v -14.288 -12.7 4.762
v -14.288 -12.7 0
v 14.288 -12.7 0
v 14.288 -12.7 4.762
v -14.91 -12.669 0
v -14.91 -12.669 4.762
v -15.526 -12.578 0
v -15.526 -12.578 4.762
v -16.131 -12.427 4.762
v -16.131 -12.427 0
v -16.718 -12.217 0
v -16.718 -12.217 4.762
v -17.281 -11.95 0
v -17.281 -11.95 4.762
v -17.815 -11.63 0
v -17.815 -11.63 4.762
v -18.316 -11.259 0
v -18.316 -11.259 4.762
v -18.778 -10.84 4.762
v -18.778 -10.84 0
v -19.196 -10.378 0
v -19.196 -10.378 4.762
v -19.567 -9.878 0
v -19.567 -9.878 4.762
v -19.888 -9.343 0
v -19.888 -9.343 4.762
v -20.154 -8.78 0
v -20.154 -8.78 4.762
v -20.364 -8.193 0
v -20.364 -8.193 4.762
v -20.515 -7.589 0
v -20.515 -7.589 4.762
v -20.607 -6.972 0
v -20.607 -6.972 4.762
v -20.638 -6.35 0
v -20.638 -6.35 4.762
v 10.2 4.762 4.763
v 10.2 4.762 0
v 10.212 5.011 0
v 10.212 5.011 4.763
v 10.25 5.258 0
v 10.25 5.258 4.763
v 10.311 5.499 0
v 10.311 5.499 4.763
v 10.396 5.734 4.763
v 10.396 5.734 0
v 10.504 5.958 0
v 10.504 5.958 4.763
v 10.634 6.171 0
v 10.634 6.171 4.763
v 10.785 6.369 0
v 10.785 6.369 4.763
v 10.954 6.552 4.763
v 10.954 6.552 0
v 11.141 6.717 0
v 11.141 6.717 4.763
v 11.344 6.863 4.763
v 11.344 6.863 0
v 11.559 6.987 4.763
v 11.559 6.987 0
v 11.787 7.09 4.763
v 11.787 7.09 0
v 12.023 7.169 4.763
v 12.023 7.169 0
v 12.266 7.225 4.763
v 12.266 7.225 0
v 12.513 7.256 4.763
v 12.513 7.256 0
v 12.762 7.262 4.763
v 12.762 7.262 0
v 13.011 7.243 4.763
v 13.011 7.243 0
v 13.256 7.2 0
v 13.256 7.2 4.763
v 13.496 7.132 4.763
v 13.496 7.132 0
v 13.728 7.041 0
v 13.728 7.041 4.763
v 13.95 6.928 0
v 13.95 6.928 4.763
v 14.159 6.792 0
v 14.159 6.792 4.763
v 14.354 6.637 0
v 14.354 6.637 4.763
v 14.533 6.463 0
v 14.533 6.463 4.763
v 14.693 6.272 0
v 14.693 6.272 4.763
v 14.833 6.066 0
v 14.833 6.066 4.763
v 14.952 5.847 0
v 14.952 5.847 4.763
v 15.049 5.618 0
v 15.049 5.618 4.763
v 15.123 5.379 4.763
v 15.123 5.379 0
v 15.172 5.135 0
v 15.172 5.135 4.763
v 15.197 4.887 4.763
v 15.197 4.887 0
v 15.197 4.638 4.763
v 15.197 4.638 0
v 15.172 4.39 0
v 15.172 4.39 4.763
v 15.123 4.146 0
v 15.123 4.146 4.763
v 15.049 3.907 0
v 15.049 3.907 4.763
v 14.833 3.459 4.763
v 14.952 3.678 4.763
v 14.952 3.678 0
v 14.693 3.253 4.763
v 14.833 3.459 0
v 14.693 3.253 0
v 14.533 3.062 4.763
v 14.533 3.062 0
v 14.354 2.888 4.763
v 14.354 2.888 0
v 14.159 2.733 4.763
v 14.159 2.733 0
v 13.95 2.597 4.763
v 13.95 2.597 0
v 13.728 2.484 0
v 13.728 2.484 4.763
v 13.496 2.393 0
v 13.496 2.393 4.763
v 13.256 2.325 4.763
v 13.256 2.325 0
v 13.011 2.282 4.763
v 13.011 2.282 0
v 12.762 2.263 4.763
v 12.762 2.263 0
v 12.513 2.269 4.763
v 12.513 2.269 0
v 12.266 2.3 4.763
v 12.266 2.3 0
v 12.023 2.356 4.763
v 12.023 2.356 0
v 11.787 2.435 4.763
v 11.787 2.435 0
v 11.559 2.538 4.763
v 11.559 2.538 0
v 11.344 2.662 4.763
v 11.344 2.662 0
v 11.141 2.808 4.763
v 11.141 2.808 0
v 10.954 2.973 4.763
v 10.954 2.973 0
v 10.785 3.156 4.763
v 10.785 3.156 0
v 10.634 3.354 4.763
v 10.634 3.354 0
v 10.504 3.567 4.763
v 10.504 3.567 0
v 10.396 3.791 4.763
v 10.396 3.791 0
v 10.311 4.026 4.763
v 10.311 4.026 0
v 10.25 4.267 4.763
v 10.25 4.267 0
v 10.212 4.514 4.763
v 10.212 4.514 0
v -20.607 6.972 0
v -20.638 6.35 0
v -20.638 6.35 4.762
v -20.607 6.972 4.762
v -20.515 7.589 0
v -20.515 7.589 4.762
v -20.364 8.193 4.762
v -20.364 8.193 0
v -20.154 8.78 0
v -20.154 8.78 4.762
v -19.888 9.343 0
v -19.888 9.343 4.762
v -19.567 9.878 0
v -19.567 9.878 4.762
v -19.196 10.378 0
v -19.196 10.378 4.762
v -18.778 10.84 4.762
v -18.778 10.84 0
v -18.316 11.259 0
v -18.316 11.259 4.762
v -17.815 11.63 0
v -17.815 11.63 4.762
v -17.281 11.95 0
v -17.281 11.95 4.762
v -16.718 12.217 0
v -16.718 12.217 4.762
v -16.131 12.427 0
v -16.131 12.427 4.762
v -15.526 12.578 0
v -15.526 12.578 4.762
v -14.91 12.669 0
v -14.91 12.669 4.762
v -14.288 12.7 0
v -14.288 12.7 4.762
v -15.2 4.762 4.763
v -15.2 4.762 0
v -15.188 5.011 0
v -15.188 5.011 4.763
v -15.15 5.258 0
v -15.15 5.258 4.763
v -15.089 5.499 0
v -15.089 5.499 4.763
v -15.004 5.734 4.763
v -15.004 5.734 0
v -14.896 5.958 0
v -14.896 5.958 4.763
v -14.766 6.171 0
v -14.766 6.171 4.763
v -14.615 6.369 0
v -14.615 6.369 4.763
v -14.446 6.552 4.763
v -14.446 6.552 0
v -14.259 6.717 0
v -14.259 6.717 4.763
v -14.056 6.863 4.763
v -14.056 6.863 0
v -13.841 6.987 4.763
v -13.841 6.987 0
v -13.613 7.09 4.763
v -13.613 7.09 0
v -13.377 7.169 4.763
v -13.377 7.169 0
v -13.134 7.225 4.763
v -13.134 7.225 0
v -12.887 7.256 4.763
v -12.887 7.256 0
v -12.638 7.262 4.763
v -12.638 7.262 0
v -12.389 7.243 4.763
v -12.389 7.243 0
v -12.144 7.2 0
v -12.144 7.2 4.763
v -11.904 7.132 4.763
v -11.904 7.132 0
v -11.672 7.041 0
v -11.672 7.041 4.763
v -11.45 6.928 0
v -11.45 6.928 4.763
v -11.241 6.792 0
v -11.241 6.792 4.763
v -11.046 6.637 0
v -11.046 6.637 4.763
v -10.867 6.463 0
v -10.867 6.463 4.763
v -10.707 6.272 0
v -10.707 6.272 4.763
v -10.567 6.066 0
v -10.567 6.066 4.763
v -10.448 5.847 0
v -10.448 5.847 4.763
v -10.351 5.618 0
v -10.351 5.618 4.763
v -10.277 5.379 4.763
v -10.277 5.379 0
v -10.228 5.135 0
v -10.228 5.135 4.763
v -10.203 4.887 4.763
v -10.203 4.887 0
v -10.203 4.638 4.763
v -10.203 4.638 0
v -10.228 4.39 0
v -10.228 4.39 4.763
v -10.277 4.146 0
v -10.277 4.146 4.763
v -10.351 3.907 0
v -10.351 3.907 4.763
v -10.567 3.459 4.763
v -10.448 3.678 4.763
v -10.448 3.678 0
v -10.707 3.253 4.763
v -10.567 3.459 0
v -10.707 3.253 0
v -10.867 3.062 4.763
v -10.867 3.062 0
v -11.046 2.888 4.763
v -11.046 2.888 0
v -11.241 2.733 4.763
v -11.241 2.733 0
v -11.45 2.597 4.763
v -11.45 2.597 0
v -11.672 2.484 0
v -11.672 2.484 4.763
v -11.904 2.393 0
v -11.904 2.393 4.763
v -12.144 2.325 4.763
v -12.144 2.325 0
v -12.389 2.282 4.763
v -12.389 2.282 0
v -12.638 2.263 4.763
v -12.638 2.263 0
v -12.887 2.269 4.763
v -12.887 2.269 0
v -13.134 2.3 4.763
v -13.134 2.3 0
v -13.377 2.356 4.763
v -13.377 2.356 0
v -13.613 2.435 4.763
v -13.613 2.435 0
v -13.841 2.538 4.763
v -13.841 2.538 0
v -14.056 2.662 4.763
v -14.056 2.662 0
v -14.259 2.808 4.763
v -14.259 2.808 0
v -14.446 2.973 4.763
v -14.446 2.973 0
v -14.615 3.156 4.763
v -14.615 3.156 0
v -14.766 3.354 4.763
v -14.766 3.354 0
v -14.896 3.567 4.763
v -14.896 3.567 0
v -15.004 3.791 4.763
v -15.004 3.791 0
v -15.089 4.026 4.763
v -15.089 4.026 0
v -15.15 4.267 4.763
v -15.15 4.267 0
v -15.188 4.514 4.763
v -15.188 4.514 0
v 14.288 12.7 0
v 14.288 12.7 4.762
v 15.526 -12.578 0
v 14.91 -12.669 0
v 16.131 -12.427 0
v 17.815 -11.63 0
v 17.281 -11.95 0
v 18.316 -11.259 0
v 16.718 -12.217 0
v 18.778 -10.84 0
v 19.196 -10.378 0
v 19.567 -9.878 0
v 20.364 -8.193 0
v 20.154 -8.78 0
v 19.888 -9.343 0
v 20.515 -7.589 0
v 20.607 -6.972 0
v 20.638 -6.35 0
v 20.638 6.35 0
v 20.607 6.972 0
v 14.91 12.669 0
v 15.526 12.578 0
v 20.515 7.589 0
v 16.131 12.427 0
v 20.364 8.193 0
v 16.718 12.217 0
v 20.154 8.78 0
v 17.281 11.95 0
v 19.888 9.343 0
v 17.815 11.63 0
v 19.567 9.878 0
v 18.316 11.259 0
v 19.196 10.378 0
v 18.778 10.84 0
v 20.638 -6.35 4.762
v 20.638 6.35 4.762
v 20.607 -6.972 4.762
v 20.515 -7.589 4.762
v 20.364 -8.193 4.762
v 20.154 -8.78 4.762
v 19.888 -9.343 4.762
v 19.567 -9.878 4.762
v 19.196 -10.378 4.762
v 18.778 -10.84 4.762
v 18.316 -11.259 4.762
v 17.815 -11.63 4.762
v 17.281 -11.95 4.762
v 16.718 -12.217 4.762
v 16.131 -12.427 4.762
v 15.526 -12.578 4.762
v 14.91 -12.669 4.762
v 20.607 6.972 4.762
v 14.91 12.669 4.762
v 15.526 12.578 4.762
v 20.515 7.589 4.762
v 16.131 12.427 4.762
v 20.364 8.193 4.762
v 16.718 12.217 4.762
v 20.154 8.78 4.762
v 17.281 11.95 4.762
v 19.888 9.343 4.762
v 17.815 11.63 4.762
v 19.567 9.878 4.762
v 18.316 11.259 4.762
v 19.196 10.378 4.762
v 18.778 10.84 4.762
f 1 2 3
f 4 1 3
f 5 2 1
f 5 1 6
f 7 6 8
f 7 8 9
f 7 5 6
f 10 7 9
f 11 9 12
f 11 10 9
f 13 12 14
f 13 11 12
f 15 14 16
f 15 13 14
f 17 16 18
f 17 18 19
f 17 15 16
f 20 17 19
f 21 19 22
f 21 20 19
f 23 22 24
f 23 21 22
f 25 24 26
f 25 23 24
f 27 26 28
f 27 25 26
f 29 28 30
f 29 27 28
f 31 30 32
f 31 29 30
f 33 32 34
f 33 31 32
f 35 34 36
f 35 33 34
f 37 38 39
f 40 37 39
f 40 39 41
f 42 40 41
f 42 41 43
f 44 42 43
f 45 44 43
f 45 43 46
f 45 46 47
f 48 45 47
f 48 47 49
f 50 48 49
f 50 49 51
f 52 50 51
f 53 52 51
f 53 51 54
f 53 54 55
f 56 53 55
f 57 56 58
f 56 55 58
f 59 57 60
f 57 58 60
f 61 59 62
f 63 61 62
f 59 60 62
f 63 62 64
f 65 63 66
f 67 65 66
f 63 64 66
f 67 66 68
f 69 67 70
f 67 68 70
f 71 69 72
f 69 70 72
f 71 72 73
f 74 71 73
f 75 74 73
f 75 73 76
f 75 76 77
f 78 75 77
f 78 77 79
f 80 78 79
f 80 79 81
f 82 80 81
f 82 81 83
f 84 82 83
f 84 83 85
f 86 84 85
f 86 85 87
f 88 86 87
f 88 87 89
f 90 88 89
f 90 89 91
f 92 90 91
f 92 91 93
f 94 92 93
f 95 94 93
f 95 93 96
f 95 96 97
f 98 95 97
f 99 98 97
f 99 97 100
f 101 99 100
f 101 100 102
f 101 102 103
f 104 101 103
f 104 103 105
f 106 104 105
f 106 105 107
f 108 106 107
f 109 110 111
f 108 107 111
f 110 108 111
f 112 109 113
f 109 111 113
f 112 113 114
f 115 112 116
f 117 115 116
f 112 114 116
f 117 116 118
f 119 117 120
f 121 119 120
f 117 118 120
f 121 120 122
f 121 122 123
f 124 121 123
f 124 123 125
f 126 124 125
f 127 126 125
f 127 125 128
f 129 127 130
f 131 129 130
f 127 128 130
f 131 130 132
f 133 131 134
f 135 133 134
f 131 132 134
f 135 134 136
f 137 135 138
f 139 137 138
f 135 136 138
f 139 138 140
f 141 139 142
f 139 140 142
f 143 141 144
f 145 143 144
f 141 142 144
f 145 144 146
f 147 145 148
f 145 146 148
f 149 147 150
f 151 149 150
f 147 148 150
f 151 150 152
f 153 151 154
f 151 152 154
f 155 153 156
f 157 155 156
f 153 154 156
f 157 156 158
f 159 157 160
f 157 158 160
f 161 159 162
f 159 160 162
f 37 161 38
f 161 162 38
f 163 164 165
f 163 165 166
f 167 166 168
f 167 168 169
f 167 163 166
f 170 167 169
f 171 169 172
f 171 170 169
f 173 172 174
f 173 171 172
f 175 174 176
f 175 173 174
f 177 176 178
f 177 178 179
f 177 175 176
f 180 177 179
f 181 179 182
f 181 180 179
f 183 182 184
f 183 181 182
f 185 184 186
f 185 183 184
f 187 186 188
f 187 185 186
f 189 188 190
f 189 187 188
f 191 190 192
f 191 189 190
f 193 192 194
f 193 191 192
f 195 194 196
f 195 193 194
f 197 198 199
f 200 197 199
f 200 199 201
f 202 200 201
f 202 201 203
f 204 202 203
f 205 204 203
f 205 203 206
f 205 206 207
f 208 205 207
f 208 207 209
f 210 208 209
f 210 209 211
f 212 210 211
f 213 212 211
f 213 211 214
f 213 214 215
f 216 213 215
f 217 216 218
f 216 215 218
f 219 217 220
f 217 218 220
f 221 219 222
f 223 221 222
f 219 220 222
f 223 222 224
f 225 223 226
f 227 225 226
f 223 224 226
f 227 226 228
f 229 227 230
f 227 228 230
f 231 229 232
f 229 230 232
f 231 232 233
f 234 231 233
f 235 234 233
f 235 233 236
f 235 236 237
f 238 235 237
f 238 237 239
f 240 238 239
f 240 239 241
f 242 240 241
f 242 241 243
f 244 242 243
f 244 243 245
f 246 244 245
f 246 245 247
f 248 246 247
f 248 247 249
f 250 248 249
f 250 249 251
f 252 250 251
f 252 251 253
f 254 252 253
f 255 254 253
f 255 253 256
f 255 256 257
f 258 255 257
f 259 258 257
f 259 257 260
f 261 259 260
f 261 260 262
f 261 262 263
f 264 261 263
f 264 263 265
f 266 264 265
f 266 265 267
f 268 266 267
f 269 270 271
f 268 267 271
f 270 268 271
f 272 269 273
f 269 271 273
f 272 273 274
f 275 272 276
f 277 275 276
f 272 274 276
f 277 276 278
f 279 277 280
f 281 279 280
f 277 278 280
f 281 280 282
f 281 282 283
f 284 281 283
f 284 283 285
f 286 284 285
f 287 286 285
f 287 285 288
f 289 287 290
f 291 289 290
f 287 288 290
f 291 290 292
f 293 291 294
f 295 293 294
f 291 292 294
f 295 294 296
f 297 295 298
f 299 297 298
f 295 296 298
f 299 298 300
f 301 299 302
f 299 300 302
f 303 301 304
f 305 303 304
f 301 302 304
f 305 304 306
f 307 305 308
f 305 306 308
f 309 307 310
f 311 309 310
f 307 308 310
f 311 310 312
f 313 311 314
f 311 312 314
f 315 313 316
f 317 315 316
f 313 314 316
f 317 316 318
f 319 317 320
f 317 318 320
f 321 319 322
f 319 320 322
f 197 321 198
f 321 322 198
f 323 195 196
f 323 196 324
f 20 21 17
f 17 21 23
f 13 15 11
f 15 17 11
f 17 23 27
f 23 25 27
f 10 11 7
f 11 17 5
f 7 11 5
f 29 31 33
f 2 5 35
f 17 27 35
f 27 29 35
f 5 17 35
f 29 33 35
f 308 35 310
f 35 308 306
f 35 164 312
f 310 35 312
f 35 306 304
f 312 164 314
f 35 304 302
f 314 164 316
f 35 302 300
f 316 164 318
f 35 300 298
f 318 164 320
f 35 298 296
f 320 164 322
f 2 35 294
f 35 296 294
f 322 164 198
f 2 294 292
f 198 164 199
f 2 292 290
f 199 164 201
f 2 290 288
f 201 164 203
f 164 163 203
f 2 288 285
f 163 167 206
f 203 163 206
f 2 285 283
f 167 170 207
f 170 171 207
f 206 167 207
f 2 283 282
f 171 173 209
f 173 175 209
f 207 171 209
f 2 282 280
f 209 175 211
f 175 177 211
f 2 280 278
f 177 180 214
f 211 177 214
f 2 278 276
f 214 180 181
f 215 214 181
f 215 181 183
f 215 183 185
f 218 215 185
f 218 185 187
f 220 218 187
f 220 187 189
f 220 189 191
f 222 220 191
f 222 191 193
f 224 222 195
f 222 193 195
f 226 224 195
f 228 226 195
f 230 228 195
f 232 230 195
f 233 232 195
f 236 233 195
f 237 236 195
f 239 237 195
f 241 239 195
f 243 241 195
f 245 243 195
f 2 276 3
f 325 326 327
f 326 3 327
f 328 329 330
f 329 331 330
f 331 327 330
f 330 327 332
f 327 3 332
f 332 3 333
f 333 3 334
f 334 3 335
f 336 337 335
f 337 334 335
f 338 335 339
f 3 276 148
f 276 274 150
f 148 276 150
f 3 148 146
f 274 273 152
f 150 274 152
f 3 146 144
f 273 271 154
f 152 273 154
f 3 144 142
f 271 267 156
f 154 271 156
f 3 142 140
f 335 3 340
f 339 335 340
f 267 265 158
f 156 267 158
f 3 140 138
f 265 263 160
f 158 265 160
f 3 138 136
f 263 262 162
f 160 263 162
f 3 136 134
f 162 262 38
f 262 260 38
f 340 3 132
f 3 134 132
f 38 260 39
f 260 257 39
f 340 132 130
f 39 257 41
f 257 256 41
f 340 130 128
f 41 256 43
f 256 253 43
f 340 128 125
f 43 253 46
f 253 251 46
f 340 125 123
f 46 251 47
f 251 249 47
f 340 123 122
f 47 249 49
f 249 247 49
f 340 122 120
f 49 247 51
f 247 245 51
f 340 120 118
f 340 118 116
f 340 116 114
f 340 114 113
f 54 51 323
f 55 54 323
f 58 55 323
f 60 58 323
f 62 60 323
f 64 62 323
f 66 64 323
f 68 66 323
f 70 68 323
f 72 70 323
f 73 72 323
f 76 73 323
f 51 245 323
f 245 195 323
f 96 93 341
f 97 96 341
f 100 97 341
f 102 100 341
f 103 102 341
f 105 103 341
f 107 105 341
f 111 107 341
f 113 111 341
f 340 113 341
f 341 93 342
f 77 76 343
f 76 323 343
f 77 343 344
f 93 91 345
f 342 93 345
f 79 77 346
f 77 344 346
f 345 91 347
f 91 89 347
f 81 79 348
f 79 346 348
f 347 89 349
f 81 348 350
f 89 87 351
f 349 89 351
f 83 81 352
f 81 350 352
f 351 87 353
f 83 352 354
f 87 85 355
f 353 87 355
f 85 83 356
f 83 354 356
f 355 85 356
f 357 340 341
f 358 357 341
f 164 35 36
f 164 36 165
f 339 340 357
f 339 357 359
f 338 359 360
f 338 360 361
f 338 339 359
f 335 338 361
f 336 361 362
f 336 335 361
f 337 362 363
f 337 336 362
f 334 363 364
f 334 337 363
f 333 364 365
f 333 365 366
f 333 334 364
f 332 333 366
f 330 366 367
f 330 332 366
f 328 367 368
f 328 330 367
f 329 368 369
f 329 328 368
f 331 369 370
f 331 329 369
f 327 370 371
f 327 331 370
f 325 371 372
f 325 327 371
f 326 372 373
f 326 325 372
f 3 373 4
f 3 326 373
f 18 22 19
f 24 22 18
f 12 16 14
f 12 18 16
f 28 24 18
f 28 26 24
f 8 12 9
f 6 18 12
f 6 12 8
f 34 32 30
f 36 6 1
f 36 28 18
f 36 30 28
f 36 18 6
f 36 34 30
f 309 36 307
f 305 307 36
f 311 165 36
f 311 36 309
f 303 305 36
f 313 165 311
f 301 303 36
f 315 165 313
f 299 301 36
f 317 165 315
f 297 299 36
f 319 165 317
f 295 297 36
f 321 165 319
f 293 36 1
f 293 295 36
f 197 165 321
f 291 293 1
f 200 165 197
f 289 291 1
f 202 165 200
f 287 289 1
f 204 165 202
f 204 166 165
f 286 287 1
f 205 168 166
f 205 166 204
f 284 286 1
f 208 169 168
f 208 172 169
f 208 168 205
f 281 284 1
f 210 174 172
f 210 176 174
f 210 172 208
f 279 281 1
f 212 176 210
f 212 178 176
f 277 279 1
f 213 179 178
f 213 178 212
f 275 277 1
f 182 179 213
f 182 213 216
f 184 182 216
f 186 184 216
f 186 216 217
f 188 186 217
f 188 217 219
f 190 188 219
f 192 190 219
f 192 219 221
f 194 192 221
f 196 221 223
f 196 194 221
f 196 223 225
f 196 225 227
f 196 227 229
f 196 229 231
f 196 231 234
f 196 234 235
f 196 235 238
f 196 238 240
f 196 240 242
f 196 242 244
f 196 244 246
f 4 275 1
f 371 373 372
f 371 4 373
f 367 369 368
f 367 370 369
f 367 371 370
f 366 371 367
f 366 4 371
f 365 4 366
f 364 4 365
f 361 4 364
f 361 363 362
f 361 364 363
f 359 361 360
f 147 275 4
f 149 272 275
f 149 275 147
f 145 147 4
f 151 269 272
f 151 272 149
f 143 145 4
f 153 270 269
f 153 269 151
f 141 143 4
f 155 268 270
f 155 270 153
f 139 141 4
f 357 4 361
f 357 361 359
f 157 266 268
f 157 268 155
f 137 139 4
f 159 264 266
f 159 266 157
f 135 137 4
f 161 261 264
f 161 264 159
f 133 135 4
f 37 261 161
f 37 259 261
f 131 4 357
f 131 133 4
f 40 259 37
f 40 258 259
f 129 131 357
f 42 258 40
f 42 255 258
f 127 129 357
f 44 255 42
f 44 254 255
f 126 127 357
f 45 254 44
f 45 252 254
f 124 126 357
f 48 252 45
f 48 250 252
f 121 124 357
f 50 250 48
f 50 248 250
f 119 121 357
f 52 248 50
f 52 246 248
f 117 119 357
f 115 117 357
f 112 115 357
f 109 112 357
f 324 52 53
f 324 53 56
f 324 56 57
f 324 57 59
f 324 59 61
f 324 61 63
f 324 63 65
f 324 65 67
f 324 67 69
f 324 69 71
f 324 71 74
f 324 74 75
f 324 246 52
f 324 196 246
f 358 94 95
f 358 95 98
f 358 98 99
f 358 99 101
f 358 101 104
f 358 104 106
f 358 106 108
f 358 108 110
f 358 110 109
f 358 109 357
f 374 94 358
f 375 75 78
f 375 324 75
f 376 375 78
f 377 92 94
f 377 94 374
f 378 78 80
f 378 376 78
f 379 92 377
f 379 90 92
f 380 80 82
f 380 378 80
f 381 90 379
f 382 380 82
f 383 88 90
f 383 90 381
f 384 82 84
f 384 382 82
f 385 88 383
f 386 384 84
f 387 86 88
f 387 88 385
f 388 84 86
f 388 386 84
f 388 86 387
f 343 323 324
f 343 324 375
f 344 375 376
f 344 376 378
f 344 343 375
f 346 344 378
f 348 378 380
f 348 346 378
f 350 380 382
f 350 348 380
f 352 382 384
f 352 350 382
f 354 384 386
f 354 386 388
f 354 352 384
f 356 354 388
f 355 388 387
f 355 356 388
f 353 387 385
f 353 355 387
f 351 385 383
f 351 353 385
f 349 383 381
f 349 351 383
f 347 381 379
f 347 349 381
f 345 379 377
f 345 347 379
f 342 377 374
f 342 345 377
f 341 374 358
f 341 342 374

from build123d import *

# Parameters (mm, degrees)
SKETCH1_W             = 41.275
SKETCH1_H             = 25.4
BASE_FLANGE1_DEPTH    = 4.7625
BREAK_CORNER1_DEPTH   = 4.7625
M6X1_0_TAPPED_HOLE1_D = 5


# Read off the part's stored shape, not the designer's step: Break-Corner1
# Sheet-metal steps are written as plain solids
with BuildPart() as part:
    # Sketch1 → Base-Flange1 (new body)
    with BuildSketch(Plane.XY):
        Rectangle(SKETCH1_W, SKETCH1_H)
    extrude(amount=BASE_FLANGE1_DEPTH)

    # Break-Corner1 outline → Break-Corner1 (cut)
    with BuildSketch(Plane.XY):
        with BuildLine():
            Line((-20.6375, 12.7), (-20.6375, 6.35))
            ThreePointArc((-20.6375, 6.35), (-18.777628061, 10.840128061), (-14.2875, 12.7))
            Line((-14.2875, 12.7), (-20.6375, 12.7))
        make_face()
        with BuildLine():
            ThreePointArc((-14.2875, -12.7), (-18.777628061, -10.840128061), (-20.6375, -6.35))
            Line((-20.6375, -6.35), (-20.6375, -12.7))
            Line((-20.6375, -12.7), (-14.2875, -12.7))
        make_face()
        with BuildLine():
            Line((20.6375, 12.7), (14.2875, 12.7))
            ThreePointArc((14.2875, 12.7), (18.777628061, 10.840128061), (20.6375, 6.35))
            Line((20.6375, 6.35), (20.6375, 12.7))
        make_face()
        with BuildLine():
            ThreePointArc((20.6375, -6.35), (18.777628061, -10.840128061), (14.2875, -12.7))
            Line((14.2875, -12.7), (20.6375, -12.7))
            Line((20.6375, -12.7), (20.6375, -6.35))
        make_face()
    extrude(amount=BREAK_CORNER1_DEPTH, mode=Mode.SUBTRACT)

    # M6x1.0 Tapped Hole1 (through all)
    with Locations(Plane.XY.offset(4.7625)):
        with Locations((-12.7, 4.7625), (12.7, 4.7625)):
            Hole(M6X1_0_TAPPED_HOLE1_D / 2)


solid = part.part
